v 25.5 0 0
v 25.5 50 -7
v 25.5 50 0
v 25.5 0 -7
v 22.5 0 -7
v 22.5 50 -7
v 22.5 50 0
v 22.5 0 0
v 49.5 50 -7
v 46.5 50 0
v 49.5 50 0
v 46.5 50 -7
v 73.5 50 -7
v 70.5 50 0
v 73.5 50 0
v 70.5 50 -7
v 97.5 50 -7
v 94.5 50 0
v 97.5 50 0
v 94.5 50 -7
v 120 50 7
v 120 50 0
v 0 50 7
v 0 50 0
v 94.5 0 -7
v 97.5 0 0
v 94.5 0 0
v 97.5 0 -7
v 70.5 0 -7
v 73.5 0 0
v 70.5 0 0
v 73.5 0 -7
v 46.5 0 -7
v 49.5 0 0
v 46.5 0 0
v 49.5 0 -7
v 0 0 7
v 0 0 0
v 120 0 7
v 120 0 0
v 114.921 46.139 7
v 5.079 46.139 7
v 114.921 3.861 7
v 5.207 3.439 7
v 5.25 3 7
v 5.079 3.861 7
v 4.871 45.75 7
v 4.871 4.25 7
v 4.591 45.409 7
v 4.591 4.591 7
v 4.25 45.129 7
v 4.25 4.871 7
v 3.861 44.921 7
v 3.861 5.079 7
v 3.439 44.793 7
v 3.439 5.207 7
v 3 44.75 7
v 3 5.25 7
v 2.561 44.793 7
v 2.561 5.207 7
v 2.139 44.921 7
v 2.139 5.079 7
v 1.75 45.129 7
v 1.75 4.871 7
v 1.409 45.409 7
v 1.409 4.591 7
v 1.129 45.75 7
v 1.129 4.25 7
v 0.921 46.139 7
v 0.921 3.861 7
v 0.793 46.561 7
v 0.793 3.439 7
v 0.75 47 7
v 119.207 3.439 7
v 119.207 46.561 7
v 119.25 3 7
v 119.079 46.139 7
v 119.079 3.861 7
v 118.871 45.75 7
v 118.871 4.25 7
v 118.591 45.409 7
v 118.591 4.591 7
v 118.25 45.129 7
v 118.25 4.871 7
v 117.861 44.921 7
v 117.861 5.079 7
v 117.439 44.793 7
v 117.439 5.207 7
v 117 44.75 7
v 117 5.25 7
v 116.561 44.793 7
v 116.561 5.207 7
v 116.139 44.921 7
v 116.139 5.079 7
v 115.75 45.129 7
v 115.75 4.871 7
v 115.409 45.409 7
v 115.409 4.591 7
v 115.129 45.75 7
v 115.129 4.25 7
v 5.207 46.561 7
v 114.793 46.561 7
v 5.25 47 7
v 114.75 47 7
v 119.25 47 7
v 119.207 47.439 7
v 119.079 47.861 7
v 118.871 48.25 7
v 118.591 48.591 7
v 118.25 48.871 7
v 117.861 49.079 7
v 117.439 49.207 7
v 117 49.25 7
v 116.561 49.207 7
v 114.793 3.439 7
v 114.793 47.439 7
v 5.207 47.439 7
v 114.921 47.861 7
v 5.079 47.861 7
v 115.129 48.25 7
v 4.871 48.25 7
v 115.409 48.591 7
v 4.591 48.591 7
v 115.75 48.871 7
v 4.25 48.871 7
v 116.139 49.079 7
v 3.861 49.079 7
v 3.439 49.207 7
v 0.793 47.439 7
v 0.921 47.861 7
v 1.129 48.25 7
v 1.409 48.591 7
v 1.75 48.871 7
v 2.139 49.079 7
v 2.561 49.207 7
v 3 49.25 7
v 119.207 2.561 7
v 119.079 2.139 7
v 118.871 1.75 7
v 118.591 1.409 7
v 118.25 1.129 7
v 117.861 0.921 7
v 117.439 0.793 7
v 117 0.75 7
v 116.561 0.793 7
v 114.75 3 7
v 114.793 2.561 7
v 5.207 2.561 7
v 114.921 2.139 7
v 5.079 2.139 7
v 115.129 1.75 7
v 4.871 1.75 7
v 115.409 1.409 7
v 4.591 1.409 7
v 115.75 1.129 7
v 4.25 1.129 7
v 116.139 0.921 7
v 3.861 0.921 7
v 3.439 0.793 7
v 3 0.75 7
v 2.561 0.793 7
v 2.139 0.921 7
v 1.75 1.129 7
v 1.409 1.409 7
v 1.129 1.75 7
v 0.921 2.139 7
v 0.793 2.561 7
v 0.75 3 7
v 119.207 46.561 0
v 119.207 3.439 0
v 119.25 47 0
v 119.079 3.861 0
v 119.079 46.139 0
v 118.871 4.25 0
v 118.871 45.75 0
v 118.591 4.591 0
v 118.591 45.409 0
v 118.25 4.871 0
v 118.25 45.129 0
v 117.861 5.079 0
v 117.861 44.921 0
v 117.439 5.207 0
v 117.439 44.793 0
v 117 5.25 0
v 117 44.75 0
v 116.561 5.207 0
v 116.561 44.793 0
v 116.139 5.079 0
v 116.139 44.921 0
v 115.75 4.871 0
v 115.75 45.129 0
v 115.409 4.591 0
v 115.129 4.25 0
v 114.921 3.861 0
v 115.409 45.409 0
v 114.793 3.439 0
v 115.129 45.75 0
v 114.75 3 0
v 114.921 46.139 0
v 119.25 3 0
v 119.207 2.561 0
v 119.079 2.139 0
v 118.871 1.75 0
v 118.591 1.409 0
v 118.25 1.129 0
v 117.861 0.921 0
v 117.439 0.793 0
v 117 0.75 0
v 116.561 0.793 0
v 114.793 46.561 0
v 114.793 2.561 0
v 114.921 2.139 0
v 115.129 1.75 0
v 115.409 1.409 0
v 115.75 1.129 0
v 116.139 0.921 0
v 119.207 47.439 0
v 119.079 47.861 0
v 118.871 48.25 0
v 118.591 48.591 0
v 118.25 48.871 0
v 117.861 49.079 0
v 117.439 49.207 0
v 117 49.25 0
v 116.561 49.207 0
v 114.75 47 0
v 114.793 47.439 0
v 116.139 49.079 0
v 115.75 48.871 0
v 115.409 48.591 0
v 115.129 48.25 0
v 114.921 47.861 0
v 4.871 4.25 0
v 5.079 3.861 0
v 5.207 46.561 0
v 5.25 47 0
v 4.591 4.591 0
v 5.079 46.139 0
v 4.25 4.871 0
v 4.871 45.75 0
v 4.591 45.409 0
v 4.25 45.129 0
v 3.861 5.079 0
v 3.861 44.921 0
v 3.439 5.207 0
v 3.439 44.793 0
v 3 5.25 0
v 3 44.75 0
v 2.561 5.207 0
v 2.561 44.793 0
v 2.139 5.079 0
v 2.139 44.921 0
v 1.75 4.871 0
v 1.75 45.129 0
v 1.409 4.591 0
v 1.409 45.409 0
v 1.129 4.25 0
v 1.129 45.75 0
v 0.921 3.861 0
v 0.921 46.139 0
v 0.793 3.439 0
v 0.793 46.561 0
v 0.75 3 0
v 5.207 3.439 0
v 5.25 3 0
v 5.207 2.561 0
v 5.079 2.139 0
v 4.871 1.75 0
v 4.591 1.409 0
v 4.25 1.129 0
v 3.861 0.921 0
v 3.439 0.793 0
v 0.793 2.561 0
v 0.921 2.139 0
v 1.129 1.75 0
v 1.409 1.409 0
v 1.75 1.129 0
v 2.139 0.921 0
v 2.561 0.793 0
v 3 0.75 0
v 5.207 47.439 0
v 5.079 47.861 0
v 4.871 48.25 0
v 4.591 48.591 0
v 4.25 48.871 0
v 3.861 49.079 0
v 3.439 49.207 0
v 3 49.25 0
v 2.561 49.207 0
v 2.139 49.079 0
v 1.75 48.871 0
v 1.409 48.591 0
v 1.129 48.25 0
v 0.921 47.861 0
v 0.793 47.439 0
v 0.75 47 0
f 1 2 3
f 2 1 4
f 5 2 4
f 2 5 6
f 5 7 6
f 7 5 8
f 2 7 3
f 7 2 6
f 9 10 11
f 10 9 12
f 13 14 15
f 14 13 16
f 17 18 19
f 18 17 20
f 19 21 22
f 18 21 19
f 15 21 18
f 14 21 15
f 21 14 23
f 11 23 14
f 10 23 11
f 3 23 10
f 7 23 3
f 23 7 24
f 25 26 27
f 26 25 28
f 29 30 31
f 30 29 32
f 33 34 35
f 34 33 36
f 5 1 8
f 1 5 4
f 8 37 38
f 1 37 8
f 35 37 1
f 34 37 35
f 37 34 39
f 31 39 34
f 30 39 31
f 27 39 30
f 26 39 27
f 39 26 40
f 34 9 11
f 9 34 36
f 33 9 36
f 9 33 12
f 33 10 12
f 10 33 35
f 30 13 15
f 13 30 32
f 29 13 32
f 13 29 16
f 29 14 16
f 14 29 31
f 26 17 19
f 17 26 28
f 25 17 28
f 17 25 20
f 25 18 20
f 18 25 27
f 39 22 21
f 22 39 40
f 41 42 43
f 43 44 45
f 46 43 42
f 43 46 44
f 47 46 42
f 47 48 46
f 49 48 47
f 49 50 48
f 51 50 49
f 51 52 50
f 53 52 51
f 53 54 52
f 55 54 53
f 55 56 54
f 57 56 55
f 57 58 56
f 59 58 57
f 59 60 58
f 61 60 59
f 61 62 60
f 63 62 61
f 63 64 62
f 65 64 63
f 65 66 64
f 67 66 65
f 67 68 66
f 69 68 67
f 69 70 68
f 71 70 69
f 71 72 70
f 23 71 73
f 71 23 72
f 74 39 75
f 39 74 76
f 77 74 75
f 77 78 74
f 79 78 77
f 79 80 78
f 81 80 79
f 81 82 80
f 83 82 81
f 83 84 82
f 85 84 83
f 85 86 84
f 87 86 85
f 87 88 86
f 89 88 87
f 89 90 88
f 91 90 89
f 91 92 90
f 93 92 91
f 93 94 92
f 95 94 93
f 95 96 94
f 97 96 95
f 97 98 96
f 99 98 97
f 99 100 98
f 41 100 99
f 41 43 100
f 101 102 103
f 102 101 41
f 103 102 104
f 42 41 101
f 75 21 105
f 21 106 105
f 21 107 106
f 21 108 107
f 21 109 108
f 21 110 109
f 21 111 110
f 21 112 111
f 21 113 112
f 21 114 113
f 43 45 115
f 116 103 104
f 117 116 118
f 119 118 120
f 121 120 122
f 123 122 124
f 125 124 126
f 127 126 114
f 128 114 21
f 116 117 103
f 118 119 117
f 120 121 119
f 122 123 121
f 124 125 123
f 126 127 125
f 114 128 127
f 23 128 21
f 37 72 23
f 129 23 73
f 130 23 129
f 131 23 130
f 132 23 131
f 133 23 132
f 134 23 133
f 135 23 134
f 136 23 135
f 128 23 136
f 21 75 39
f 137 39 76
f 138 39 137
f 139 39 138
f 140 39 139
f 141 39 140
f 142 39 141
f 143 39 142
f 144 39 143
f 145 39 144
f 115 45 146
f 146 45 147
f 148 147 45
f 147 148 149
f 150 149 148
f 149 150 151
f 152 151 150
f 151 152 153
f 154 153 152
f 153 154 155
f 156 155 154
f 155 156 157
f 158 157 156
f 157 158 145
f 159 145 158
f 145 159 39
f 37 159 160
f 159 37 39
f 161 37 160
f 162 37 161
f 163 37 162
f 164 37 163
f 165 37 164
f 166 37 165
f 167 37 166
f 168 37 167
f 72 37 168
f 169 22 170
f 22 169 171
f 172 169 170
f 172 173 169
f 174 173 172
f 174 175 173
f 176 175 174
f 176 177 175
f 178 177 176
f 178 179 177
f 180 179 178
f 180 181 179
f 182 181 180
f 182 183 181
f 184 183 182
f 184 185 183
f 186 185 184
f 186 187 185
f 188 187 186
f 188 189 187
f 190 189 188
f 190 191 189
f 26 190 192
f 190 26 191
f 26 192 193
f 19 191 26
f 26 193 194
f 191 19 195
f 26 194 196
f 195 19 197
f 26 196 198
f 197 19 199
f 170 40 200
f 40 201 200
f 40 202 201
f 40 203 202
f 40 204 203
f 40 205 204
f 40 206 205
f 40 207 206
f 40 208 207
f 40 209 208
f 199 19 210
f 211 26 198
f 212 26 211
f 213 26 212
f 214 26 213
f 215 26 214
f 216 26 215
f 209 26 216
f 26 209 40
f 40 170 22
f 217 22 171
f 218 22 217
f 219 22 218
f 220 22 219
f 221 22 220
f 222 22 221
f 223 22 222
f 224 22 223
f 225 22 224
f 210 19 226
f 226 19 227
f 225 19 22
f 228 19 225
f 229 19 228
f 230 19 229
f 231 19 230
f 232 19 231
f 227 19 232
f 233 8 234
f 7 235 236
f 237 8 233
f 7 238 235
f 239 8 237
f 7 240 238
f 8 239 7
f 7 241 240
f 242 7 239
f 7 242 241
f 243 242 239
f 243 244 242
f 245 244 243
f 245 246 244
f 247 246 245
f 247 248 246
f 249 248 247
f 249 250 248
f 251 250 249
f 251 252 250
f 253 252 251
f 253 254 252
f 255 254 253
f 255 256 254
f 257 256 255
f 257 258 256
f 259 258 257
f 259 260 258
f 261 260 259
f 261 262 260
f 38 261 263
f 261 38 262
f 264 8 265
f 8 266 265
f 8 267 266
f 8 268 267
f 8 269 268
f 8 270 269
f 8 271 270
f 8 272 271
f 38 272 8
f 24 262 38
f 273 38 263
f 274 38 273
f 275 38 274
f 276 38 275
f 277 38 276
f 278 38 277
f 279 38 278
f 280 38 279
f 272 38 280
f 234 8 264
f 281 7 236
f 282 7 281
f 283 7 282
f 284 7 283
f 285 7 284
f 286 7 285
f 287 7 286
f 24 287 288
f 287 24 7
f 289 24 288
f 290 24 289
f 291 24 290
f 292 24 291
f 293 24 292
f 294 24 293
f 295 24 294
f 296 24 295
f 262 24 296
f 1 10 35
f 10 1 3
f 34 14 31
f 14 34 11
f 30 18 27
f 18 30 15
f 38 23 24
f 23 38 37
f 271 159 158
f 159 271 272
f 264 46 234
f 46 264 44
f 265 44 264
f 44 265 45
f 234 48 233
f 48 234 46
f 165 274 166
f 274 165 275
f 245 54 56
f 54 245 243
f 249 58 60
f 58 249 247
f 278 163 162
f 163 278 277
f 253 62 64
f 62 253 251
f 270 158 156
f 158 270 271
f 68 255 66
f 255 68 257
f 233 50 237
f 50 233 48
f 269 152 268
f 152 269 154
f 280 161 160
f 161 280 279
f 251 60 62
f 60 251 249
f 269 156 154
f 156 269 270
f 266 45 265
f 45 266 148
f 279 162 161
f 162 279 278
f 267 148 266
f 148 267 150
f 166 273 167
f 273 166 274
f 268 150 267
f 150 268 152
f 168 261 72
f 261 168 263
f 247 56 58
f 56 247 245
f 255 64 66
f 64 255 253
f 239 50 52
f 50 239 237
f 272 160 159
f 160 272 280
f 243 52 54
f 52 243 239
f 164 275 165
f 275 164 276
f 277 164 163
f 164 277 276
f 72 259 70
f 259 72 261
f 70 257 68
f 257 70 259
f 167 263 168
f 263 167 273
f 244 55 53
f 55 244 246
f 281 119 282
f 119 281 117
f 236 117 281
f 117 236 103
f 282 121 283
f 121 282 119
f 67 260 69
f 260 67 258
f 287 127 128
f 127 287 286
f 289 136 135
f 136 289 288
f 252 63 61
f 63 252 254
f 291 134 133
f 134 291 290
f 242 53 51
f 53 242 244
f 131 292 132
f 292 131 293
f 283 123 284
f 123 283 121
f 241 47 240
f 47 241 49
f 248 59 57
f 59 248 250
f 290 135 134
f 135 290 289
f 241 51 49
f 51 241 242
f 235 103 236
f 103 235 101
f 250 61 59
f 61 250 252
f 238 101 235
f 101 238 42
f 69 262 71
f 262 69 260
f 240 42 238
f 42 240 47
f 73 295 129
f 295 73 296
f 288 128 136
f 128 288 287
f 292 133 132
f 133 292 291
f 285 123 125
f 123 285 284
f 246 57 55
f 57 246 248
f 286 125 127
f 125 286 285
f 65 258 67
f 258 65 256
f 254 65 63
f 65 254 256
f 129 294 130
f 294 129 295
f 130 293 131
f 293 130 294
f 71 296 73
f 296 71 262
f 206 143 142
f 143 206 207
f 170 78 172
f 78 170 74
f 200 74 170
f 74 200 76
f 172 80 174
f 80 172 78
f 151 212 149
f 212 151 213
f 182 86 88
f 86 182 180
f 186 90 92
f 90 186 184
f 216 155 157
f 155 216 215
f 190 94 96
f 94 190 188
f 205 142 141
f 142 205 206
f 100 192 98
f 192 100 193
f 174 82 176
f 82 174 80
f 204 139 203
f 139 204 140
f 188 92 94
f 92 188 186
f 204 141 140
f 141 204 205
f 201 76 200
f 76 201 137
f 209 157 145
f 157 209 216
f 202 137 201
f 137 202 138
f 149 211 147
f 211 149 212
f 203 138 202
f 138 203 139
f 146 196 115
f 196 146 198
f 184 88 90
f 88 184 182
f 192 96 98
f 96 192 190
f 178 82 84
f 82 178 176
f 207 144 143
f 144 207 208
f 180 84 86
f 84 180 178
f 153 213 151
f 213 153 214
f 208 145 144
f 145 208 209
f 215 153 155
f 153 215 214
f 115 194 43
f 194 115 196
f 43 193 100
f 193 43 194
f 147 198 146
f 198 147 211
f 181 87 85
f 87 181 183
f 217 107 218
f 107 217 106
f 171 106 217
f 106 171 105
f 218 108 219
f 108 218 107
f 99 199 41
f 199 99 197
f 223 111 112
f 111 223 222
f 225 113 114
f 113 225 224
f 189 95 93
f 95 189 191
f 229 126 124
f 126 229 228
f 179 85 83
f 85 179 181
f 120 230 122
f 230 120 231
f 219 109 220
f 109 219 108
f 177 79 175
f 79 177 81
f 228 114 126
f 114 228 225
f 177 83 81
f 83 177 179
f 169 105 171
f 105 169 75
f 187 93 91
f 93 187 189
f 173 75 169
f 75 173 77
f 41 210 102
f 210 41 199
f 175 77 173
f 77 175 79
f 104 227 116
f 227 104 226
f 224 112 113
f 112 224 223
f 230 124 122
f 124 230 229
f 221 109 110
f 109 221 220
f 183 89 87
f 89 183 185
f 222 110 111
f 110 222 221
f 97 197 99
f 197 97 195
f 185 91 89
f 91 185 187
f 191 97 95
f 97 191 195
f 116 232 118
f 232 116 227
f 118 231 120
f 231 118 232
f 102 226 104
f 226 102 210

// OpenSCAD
$fn = 32;

// ----------------------------------------------------------------------
// Enclosure lid: 120 x 50 x 7 mm, 4 bolt holes
// ----------------------------------------------------------------------

// --- parameters (mm) ---
length = 120;             // lid length, X
width = 50;               // lid width, Y
plate_t = 7;              // lid plate thickness
bolt_d = 4.5;             // bolt clearance
boss_lip = 3;             // bolt hole inset from the corner
sink = 1;                 // overlap of the lip and ribs into the plate
rib_n = 4;                // stiffening ribs
rib_t = 3;                // rib thickness
rib_h = 8;                // rib height below the plate

module plate() {
  cube([length, width, plate_t]);
  /* stiffening ribs under the plate */
  for (i = [1 : rib_n]) translate([length * i / (rib_n + 1) - rib_t / 2, 0, -rib_h + sink]) cube([rib_t, width - 2 * 0, rib_h]);
}

difference() {
  plate();
  /* bolt pattern matching the corner bosses */
  for (sx = [0, 1]) for (sy = [0, 1])
    translate([sx * (length - 2 * boss_lip) + boss_lip, sy * (width - 2 * boss_lip) + boss_lip, -0 - 1])
      cylinder(h = plate_t + 0 + 2, d = bolt_d);
}
